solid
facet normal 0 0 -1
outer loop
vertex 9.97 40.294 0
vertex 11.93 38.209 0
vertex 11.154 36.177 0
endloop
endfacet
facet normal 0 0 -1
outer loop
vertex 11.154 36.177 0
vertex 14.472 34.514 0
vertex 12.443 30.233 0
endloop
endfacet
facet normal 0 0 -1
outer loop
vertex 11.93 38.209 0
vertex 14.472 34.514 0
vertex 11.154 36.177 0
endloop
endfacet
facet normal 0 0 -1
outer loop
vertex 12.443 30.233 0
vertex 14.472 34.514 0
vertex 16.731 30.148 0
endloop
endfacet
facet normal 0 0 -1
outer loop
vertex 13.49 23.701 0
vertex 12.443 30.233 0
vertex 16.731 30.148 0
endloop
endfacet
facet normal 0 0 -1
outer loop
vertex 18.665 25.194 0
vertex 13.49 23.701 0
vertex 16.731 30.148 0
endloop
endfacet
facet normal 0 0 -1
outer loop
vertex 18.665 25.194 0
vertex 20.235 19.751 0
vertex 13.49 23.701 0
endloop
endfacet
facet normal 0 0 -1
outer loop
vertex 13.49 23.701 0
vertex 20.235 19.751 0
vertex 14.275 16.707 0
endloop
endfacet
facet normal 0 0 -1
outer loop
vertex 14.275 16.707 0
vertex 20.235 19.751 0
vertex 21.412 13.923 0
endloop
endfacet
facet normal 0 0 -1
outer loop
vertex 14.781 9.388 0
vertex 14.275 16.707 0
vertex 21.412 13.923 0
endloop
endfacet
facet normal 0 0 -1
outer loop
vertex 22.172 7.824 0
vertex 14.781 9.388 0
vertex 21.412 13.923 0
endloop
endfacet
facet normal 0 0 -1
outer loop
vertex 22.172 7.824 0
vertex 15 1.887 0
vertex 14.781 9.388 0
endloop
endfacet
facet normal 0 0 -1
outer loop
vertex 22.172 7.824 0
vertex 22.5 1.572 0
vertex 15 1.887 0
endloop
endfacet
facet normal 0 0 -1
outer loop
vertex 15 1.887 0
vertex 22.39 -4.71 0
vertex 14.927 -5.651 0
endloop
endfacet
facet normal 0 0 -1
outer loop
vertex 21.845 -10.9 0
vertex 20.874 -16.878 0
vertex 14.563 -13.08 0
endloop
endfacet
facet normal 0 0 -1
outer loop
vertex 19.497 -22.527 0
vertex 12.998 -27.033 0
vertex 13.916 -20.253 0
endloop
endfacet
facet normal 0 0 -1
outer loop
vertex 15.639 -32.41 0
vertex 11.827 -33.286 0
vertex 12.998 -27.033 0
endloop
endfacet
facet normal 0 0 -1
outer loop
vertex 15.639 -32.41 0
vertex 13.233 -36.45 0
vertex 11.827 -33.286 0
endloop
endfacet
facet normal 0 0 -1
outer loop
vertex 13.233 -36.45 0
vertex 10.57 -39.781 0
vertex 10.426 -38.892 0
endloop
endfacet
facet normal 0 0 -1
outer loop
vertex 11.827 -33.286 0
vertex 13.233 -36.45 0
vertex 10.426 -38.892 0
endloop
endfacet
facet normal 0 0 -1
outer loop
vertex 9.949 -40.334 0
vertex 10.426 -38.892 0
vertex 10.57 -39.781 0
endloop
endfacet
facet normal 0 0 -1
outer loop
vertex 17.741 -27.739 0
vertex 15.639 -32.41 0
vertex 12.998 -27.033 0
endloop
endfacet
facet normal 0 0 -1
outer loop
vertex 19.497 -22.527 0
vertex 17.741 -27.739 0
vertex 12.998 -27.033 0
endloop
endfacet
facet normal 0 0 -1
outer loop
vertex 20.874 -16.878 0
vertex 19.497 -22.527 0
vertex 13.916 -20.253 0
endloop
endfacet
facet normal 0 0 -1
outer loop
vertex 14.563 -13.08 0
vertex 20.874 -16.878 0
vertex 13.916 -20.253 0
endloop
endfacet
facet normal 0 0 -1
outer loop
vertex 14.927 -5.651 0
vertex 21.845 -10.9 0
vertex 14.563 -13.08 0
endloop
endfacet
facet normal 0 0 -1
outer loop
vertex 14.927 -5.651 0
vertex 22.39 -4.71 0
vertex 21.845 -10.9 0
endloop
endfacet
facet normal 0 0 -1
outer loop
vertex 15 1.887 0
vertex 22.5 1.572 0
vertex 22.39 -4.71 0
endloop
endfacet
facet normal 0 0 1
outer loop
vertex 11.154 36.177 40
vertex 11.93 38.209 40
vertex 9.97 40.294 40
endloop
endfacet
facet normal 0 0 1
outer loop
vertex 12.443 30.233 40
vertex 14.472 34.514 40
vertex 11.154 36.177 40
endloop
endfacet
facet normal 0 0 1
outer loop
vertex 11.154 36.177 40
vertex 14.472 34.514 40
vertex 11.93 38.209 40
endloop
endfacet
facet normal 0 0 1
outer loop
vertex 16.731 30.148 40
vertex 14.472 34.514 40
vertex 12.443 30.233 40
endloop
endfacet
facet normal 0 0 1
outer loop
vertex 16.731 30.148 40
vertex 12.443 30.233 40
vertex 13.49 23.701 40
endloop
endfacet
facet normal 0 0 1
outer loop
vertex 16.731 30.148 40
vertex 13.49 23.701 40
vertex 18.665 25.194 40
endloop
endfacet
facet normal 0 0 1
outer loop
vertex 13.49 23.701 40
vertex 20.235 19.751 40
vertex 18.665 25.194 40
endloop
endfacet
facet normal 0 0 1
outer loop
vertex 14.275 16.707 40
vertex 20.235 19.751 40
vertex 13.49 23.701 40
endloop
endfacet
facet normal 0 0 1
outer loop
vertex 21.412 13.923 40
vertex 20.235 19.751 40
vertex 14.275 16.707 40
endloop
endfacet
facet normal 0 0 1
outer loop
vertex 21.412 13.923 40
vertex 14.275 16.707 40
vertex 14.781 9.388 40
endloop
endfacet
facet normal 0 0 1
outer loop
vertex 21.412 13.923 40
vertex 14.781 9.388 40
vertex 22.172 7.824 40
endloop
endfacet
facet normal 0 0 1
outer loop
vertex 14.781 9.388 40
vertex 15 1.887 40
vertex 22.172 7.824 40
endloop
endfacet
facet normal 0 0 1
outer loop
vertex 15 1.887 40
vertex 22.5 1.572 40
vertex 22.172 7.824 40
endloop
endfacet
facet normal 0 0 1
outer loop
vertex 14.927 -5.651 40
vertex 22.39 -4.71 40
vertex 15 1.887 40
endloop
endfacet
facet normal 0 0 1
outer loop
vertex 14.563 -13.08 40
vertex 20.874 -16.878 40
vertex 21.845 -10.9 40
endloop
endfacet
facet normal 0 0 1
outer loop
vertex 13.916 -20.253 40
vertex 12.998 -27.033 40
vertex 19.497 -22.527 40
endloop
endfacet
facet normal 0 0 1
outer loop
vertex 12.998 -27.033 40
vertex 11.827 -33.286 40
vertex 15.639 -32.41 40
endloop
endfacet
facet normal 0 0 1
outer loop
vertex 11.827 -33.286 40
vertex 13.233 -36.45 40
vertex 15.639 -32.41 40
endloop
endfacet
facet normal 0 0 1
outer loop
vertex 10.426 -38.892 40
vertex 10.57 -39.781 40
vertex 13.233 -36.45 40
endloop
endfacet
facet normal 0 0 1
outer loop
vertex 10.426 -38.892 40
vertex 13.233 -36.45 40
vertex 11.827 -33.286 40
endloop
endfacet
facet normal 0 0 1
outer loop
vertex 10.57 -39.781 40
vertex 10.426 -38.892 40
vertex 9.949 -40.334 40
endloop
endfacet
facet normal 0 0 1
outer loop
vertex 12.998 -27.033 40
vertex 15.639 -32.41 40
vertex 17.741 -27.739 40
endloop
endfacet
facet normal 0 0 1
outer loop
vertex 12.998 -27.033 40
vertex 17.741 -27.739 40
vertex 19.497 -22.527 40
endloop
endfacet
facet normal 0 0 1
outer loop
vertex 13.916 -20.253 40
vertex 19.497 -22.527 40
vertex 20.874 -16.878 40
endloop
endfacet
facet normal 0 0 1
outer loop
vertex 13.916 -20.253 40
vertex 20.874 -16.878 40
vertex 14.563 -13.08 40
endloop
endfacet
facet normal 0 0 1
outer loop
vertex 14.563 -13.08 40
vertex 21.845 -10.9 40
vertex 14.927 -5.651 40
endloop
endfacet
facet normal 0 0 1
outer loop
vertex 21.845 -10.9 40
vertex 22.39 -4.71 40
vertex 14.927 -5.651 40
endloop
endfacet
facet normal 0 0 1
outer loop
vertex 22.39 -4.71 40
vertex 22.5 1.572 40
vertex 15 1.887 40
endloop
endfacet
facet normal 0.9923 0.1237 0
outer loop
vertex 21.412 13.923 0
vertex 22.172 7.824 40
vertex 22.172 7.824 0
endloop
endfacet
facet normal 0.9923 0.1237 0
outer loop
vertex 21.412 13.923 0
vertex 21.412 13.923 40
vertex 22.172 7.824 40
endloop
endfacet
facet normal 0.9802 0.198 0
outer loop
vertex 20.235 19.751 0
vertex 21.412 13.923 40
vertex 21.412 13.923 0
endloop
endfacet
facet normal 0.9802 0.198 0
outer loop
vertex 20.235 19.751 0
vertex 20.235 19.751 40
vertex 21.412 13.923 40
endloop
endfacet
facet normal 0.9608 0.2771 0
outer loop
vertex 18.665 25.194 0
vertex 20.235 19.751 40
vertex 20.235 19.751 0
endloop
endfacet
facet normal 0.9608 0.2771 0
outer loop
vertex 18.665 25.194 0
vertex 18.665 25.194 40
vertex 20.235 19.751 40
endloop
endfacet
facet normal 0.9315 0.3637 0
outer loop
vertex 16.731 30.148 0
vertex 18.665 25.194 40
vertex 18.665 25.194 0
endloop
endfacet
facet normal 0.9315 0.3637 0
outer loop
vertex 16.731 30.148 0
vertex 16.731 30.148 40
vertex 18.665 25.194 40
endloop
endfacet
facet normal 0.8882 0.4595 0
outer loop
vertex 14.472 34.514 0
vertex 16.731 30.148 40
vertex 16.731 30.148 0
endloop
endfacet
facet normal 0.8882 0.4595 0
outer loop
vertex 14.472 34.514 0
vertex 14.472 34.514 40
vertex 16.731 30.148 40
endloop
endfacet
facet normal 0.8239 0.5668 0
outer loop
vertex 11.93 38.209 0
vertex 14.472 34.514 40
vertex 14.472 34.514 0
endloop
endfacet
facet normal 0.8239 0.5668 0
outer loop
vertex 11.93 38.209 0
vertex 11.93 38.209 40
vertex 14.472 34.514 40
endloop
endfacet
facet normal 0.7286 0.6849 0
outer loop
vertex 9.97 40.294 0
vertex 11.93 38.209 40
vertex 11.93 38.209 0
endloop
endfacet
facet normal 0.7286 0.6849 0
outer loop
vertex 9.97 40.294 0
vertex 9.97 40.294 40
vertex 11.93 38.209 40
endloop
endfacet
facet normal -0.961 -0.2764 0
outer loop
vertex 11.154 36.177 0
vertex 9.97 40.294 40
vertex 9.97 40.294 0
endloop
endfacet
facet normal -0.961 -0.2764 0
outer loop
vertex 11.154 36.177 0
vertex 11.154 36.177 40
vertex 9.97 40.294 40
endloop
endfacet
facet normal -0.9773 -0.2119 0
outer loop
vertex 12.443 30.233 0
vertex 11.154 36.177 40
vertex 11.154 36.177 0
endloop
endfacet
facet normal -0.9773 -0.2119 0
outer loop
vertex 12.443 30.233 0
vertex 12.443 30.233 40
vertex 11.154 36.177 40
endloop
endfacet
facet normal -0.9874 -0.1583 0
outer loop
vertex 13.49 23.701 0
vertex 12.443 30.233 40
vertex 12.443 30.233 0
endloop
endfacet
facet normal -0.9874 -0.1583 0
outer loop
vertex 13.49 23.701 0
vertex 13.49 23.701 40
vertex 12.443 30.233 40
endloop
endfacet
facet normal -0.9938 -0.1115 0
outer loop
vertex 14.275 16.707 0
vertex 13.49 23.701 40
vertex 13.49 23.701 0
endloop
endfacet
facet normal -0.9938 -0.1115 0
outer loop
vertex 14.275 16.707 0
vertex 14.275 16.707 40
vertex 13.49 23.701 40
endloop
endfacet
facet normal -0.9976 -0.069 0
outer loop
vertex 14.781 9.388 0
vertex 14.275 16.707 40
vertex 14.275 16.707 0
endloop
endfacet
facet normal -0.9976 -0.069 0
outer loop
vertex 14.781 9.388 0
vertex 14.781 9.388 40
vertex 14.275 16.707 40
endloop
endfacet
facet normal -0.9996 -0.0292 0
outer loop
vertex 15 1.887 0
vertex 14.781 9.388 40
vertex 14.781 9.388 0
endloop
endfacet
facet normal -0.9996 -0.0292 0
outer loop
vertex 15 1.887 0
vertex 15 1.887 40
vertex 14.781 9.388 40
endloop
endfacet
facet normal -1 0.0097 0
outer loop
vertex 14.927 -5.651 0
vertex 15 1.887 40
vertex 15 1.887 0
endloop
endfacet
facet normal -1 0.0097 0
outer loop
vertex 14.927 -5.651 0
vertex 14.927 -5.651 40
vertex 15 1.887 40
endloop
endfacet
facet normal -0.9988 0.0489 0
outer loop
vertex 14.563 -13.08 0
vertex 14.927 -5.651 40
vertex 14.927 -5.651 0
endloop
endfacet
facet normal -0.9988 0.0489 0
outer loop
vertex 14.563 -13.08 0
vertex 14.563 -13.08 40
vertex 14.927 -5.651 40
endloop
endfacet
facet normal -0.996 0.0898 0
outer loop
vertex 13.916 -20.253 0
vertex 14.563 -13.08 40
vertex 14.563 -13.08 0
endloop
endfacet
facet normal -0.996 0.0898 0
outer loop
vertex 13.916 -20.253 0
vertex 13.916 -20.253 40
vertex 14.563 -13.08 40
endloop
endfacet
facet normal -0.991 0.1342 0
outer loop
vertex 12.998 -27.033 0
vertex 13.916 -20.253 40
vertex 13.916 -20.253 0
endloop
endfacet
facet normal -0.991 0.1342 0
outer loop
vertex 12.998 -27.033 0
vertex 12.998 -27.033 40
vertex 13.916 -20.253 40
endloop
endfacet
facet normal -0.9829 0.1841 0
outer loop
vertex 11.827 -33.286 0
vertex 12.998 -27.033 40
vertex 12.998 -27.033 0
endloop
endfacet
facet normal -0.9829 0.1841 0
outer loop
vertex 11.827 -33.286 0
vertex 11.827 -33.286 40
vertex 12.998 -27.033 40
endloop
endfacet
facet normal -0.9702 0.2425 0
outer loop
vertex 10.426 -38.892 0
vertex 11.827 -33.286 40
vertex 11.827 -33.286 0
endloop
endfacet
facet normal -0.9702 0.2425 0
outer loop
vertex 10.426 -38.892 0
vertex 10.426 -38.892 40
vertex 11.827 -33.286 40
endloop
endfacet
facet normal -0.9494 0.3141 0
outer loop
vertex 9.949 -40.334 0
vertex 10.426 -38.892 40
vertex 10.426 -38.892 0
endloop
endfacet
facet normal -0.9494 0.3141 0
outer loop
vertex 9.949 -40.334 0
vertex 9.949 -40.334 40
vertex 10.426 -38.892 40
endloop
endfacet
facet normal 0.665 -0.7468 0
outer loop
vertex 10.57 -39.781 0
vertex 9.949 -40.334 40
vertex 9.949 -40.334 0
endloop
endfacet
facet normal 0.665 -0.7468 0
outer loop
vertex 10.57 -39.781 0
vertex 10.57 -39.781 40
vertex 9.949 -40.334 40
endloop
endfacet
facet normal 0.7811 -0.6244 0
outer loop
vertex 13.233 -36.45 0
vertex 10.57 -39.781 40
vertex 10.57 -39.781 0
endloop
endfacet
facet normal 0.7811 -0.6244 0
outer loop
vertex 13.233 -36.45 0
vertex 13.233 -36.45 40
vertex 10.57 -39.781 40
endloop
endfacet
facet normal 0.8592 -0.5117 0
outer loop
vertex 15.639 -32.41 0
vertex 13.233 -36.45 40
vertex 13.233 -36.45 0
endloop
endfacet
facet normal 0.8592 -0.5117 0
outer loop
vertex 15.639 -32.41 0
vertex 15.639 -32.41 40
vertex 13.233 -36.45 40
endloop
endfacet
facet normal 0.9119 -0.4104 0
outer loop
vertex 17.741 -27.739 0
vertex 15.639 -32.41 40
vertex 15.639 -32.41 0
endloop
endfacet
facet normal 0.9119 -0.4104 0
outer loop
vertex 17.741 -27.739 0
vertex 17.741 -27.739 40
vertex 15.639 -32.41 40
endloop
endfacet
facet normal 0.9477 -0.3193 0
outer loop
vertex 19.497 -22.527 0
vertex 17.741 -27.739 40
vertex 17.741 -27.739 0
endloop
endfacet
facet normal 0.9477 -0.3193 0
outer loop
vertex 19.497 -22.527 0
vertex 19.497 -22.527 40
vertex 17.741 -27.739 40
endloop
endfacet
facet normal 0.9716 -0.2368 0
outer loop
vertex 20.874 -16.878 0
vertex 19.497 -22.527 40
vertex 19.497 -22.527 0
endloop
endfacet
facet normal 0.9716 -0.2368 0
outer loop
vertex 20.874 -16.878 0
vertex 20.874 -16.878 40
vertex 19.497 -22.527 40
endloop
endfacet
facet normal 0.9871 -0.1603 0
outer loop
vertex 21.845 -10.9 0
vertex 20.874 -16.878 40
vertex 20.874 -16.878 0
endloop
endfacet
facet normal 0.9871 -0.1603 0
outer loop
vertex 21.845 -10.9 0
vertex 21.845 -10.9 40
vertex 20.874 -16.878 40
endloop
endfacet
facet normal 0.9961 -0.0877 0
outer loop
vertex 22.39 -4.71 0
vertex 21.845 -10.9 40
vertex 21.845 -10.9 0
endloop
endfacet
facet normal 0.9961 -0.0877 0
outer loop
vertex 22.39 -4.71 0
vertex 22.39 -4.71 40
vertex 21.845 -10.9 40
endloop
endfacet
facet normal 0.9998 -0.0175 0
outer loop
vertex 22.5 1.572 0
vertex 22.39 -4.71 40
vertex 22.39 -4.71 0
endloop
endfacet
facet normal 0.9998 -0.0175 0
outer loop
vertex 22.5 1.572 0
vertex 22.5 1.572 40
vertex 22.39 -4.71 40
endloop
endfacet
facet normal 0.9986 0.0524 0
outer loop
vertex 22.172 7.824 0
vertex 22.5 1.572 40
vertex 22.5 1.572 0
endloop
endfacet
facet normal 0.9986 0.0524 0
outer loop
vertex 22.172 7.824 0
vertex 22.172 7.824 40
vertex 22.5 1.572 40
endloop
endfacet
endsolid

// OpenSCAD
$fn=45;


module foot(L, W){
    union(){
        cylinder(L,d=W, center=true);
        translate([0,0,L/2]) sphere(d=W);  // end cap
        translate([0,0,-L/2]) sphere(d=W);  // end cap
    }
}
    
module tibia(){
    L = 100;
    union(){
        rotate([0,-10,0]) scale([1,1.2,1.5]) difference(){
            scale([2, .9, .55]) sphere(d=L); //d=5
            translate([0,1/5*L,-2/5*L]) scale([2.5, .5, .8]) sphere(d=8/5*L);  // d=8
            translate([0,-1/5*L,-2/5*L]) scale([2.5, .5, .8]) sphere(d=8/5*L);
        }
        translate([-1*L,0,-5]) rotate([0,-120,0]) foot(3/5*L,10);
        translate([35,0,33]) cube([25,35,15], center=true);  // mount
    }
}

module M3(t){
    dia = 3.5;
    sdia = 6;
    cylinder(3*t, d=dia, center=true);  // M2
    translate([0,0,2]) cylinder(3*t, d=sdia, center=false);  // screw driver
}

module M2(t){
    dia = 2.5;
    sdia = 4;
    cylinder(3*t, d=dia, center=true);  // M2
    translate([0,0,2]) cylinder(3*t, d=sdia, center=false);  // screw driver
}


module holes(t){
    // M3 3.3 mm
    M3(t);
    
    // M2 2.3 mm
    dia = 2.3;
    translate([8,0,0]) M2(t);
    translate([-8,0,0]) M2(t);
    translate([0,8,0]) M2(t);
    translate([0,-8,0]) M2(t);
}

module pulley(dia=24, thick=3, cen=false){
    cylinder(thick,d=dia,center=cen);
}

module ax12(){
    // sort of center mass
    translate([-70,-210,-180]) import("AX-12A.STL");
}

module femur(L){
    thick = 4;
    difference(){
        union(){
            translate([L/2,0,0]) pulley(thick=thick);
            translate([-L/2,0,0]) pulley(thick=thick);
            linear_extrude(height=thick){
                difference(){
                    resize([1.2*L,L/2]) circle(d=L/3);
                    translate([0,-5,0]) resize([.75*L,L/7]) circle(d=L/3);
                    translate([-L/2,-L/2-5,0]) square([L,L/2]);
                }
            }
        }
        translate([L/2,0,0]) holes(thick);
        translate([-L/2,0,0]) holes(thick);
    }
}

module femur2(L){
    thick = 40;
//    difference(){
//        union(){
//            translate([L/2,0,0]) pulley(thick=thick);
//            translate([-L/2,0,0]) pulley(thick=thick);
            linear_extrude(height=thick)
//                rotate_extrude(angle=30, convexity = 20)
    {
                    rotate([0,0,90]) difference(){
                        resize([L,L/2]) circle(d=L/3);
                        translate([0,0,0]) resize([1.2*L,L/3]) circle(d=L/3);
                        translate([-L/2,0,0]) square([2*L,L/2]);
                    }
                }
//            }
//        }
//        translate([L/2,0,0]) holes(thick);
//        translate([-L/2,0,0]) holes(thick);
//    }
//    hull(){
//        translate([0,0,0]) circle(d=40);
//        translate([L,0,0]) circle(d=10);
//    }
    
    
}





femur2(90);
//rotate([0,0,0]) tibia();
//translate([40,-5,0]) rotate([0,90,-90]) ax12();

module hex(side,t){
    s = side/2;
    h = sqrt(side*side-s*s);
    pts = [
        [2*s,0],
        [s,h],
        [-s,h],
        [-2*s,0],
        [-s,-h],
        [s,-h]
    ];
    linear_extrude(height=t){
        polygon(pts);
    }
}

//hex(5,3);
